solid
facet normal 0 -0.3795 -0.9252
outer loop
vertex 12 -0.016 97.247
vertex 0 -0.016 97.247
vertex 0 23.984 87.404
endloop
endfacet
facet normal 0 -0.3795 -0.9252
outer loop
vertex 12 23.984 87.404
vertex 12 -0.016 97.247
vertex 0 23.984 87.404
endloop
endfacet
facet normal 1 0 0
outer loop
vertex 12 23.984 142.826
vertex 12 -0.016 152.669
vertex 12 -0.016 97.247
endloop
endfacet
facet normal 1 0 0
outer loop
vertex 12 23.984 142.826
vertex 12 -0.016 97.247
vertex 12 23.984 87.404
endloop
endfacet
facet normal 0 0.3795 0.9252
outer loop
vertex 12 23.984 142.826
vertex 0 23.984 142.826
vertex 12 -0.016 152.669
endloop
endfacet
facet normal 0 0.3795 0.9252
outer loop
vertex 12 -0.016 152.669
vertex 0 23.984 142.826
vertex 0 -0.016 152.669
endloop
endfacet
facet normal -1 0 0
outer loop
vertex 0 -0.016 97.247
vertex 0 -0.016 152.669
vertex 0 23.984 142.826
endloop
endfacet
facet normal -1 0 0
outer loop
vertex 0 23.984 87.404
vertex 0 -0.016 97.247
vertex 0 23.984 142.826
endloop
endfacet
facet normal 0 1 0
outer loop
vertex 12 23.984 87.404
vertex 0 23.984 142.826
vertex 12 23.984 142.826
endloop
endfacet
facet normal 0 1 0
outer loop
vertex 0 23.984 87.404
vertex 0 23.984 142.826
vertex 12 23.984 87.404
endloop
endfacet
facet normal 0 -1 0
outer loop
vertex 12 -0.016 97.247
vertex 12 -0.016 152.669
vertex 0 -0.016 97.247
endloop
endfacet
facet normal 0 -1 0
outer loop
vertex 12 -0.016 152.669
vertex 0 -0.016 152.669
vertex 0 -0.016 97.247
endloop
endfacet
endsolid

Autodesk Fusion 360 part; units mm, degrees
sketch "Name Sign Support" plane through (0, 0, 0) normal (1, 0, 0) x (0, 1, 0) in component "Name Sign Support (1)"
  line L0 (-0.0158, 97.2466) -> (23.9842, 87.4035)
  line L1 (23.9842, 142.8255) -> (-0.0158, 152.6686)
  line L2 (-0.0158, 152.6686) -> (-0.0158, 97.2466)
  line L3 (23.9842, 142.8255) -> (23.9842, 87.4035)
  dimension "d18" = 67.7
  dimension "d8" = 24
  dimension "d9" = 55.422
extrude "Extrude2" add sketch "Name Sign Support" along normal blind 12 in component "Name Sign Support (1)"
component "Name Sign Support Right" placed x (1, 0, 0) y (0, 1, 0) z (0, 0, 1) at (0, 0, 0)
component "Name Sign Support (1)" placed x (1, 0, 0) y (0, 1, 0) z (0, 0, 1) at (0, 0, 0) in component "Name Sign Support Right"
equation "d19 = pineThickness"
equation "pineThickness = 12 mm" comment "Thickness of the pine planks"
